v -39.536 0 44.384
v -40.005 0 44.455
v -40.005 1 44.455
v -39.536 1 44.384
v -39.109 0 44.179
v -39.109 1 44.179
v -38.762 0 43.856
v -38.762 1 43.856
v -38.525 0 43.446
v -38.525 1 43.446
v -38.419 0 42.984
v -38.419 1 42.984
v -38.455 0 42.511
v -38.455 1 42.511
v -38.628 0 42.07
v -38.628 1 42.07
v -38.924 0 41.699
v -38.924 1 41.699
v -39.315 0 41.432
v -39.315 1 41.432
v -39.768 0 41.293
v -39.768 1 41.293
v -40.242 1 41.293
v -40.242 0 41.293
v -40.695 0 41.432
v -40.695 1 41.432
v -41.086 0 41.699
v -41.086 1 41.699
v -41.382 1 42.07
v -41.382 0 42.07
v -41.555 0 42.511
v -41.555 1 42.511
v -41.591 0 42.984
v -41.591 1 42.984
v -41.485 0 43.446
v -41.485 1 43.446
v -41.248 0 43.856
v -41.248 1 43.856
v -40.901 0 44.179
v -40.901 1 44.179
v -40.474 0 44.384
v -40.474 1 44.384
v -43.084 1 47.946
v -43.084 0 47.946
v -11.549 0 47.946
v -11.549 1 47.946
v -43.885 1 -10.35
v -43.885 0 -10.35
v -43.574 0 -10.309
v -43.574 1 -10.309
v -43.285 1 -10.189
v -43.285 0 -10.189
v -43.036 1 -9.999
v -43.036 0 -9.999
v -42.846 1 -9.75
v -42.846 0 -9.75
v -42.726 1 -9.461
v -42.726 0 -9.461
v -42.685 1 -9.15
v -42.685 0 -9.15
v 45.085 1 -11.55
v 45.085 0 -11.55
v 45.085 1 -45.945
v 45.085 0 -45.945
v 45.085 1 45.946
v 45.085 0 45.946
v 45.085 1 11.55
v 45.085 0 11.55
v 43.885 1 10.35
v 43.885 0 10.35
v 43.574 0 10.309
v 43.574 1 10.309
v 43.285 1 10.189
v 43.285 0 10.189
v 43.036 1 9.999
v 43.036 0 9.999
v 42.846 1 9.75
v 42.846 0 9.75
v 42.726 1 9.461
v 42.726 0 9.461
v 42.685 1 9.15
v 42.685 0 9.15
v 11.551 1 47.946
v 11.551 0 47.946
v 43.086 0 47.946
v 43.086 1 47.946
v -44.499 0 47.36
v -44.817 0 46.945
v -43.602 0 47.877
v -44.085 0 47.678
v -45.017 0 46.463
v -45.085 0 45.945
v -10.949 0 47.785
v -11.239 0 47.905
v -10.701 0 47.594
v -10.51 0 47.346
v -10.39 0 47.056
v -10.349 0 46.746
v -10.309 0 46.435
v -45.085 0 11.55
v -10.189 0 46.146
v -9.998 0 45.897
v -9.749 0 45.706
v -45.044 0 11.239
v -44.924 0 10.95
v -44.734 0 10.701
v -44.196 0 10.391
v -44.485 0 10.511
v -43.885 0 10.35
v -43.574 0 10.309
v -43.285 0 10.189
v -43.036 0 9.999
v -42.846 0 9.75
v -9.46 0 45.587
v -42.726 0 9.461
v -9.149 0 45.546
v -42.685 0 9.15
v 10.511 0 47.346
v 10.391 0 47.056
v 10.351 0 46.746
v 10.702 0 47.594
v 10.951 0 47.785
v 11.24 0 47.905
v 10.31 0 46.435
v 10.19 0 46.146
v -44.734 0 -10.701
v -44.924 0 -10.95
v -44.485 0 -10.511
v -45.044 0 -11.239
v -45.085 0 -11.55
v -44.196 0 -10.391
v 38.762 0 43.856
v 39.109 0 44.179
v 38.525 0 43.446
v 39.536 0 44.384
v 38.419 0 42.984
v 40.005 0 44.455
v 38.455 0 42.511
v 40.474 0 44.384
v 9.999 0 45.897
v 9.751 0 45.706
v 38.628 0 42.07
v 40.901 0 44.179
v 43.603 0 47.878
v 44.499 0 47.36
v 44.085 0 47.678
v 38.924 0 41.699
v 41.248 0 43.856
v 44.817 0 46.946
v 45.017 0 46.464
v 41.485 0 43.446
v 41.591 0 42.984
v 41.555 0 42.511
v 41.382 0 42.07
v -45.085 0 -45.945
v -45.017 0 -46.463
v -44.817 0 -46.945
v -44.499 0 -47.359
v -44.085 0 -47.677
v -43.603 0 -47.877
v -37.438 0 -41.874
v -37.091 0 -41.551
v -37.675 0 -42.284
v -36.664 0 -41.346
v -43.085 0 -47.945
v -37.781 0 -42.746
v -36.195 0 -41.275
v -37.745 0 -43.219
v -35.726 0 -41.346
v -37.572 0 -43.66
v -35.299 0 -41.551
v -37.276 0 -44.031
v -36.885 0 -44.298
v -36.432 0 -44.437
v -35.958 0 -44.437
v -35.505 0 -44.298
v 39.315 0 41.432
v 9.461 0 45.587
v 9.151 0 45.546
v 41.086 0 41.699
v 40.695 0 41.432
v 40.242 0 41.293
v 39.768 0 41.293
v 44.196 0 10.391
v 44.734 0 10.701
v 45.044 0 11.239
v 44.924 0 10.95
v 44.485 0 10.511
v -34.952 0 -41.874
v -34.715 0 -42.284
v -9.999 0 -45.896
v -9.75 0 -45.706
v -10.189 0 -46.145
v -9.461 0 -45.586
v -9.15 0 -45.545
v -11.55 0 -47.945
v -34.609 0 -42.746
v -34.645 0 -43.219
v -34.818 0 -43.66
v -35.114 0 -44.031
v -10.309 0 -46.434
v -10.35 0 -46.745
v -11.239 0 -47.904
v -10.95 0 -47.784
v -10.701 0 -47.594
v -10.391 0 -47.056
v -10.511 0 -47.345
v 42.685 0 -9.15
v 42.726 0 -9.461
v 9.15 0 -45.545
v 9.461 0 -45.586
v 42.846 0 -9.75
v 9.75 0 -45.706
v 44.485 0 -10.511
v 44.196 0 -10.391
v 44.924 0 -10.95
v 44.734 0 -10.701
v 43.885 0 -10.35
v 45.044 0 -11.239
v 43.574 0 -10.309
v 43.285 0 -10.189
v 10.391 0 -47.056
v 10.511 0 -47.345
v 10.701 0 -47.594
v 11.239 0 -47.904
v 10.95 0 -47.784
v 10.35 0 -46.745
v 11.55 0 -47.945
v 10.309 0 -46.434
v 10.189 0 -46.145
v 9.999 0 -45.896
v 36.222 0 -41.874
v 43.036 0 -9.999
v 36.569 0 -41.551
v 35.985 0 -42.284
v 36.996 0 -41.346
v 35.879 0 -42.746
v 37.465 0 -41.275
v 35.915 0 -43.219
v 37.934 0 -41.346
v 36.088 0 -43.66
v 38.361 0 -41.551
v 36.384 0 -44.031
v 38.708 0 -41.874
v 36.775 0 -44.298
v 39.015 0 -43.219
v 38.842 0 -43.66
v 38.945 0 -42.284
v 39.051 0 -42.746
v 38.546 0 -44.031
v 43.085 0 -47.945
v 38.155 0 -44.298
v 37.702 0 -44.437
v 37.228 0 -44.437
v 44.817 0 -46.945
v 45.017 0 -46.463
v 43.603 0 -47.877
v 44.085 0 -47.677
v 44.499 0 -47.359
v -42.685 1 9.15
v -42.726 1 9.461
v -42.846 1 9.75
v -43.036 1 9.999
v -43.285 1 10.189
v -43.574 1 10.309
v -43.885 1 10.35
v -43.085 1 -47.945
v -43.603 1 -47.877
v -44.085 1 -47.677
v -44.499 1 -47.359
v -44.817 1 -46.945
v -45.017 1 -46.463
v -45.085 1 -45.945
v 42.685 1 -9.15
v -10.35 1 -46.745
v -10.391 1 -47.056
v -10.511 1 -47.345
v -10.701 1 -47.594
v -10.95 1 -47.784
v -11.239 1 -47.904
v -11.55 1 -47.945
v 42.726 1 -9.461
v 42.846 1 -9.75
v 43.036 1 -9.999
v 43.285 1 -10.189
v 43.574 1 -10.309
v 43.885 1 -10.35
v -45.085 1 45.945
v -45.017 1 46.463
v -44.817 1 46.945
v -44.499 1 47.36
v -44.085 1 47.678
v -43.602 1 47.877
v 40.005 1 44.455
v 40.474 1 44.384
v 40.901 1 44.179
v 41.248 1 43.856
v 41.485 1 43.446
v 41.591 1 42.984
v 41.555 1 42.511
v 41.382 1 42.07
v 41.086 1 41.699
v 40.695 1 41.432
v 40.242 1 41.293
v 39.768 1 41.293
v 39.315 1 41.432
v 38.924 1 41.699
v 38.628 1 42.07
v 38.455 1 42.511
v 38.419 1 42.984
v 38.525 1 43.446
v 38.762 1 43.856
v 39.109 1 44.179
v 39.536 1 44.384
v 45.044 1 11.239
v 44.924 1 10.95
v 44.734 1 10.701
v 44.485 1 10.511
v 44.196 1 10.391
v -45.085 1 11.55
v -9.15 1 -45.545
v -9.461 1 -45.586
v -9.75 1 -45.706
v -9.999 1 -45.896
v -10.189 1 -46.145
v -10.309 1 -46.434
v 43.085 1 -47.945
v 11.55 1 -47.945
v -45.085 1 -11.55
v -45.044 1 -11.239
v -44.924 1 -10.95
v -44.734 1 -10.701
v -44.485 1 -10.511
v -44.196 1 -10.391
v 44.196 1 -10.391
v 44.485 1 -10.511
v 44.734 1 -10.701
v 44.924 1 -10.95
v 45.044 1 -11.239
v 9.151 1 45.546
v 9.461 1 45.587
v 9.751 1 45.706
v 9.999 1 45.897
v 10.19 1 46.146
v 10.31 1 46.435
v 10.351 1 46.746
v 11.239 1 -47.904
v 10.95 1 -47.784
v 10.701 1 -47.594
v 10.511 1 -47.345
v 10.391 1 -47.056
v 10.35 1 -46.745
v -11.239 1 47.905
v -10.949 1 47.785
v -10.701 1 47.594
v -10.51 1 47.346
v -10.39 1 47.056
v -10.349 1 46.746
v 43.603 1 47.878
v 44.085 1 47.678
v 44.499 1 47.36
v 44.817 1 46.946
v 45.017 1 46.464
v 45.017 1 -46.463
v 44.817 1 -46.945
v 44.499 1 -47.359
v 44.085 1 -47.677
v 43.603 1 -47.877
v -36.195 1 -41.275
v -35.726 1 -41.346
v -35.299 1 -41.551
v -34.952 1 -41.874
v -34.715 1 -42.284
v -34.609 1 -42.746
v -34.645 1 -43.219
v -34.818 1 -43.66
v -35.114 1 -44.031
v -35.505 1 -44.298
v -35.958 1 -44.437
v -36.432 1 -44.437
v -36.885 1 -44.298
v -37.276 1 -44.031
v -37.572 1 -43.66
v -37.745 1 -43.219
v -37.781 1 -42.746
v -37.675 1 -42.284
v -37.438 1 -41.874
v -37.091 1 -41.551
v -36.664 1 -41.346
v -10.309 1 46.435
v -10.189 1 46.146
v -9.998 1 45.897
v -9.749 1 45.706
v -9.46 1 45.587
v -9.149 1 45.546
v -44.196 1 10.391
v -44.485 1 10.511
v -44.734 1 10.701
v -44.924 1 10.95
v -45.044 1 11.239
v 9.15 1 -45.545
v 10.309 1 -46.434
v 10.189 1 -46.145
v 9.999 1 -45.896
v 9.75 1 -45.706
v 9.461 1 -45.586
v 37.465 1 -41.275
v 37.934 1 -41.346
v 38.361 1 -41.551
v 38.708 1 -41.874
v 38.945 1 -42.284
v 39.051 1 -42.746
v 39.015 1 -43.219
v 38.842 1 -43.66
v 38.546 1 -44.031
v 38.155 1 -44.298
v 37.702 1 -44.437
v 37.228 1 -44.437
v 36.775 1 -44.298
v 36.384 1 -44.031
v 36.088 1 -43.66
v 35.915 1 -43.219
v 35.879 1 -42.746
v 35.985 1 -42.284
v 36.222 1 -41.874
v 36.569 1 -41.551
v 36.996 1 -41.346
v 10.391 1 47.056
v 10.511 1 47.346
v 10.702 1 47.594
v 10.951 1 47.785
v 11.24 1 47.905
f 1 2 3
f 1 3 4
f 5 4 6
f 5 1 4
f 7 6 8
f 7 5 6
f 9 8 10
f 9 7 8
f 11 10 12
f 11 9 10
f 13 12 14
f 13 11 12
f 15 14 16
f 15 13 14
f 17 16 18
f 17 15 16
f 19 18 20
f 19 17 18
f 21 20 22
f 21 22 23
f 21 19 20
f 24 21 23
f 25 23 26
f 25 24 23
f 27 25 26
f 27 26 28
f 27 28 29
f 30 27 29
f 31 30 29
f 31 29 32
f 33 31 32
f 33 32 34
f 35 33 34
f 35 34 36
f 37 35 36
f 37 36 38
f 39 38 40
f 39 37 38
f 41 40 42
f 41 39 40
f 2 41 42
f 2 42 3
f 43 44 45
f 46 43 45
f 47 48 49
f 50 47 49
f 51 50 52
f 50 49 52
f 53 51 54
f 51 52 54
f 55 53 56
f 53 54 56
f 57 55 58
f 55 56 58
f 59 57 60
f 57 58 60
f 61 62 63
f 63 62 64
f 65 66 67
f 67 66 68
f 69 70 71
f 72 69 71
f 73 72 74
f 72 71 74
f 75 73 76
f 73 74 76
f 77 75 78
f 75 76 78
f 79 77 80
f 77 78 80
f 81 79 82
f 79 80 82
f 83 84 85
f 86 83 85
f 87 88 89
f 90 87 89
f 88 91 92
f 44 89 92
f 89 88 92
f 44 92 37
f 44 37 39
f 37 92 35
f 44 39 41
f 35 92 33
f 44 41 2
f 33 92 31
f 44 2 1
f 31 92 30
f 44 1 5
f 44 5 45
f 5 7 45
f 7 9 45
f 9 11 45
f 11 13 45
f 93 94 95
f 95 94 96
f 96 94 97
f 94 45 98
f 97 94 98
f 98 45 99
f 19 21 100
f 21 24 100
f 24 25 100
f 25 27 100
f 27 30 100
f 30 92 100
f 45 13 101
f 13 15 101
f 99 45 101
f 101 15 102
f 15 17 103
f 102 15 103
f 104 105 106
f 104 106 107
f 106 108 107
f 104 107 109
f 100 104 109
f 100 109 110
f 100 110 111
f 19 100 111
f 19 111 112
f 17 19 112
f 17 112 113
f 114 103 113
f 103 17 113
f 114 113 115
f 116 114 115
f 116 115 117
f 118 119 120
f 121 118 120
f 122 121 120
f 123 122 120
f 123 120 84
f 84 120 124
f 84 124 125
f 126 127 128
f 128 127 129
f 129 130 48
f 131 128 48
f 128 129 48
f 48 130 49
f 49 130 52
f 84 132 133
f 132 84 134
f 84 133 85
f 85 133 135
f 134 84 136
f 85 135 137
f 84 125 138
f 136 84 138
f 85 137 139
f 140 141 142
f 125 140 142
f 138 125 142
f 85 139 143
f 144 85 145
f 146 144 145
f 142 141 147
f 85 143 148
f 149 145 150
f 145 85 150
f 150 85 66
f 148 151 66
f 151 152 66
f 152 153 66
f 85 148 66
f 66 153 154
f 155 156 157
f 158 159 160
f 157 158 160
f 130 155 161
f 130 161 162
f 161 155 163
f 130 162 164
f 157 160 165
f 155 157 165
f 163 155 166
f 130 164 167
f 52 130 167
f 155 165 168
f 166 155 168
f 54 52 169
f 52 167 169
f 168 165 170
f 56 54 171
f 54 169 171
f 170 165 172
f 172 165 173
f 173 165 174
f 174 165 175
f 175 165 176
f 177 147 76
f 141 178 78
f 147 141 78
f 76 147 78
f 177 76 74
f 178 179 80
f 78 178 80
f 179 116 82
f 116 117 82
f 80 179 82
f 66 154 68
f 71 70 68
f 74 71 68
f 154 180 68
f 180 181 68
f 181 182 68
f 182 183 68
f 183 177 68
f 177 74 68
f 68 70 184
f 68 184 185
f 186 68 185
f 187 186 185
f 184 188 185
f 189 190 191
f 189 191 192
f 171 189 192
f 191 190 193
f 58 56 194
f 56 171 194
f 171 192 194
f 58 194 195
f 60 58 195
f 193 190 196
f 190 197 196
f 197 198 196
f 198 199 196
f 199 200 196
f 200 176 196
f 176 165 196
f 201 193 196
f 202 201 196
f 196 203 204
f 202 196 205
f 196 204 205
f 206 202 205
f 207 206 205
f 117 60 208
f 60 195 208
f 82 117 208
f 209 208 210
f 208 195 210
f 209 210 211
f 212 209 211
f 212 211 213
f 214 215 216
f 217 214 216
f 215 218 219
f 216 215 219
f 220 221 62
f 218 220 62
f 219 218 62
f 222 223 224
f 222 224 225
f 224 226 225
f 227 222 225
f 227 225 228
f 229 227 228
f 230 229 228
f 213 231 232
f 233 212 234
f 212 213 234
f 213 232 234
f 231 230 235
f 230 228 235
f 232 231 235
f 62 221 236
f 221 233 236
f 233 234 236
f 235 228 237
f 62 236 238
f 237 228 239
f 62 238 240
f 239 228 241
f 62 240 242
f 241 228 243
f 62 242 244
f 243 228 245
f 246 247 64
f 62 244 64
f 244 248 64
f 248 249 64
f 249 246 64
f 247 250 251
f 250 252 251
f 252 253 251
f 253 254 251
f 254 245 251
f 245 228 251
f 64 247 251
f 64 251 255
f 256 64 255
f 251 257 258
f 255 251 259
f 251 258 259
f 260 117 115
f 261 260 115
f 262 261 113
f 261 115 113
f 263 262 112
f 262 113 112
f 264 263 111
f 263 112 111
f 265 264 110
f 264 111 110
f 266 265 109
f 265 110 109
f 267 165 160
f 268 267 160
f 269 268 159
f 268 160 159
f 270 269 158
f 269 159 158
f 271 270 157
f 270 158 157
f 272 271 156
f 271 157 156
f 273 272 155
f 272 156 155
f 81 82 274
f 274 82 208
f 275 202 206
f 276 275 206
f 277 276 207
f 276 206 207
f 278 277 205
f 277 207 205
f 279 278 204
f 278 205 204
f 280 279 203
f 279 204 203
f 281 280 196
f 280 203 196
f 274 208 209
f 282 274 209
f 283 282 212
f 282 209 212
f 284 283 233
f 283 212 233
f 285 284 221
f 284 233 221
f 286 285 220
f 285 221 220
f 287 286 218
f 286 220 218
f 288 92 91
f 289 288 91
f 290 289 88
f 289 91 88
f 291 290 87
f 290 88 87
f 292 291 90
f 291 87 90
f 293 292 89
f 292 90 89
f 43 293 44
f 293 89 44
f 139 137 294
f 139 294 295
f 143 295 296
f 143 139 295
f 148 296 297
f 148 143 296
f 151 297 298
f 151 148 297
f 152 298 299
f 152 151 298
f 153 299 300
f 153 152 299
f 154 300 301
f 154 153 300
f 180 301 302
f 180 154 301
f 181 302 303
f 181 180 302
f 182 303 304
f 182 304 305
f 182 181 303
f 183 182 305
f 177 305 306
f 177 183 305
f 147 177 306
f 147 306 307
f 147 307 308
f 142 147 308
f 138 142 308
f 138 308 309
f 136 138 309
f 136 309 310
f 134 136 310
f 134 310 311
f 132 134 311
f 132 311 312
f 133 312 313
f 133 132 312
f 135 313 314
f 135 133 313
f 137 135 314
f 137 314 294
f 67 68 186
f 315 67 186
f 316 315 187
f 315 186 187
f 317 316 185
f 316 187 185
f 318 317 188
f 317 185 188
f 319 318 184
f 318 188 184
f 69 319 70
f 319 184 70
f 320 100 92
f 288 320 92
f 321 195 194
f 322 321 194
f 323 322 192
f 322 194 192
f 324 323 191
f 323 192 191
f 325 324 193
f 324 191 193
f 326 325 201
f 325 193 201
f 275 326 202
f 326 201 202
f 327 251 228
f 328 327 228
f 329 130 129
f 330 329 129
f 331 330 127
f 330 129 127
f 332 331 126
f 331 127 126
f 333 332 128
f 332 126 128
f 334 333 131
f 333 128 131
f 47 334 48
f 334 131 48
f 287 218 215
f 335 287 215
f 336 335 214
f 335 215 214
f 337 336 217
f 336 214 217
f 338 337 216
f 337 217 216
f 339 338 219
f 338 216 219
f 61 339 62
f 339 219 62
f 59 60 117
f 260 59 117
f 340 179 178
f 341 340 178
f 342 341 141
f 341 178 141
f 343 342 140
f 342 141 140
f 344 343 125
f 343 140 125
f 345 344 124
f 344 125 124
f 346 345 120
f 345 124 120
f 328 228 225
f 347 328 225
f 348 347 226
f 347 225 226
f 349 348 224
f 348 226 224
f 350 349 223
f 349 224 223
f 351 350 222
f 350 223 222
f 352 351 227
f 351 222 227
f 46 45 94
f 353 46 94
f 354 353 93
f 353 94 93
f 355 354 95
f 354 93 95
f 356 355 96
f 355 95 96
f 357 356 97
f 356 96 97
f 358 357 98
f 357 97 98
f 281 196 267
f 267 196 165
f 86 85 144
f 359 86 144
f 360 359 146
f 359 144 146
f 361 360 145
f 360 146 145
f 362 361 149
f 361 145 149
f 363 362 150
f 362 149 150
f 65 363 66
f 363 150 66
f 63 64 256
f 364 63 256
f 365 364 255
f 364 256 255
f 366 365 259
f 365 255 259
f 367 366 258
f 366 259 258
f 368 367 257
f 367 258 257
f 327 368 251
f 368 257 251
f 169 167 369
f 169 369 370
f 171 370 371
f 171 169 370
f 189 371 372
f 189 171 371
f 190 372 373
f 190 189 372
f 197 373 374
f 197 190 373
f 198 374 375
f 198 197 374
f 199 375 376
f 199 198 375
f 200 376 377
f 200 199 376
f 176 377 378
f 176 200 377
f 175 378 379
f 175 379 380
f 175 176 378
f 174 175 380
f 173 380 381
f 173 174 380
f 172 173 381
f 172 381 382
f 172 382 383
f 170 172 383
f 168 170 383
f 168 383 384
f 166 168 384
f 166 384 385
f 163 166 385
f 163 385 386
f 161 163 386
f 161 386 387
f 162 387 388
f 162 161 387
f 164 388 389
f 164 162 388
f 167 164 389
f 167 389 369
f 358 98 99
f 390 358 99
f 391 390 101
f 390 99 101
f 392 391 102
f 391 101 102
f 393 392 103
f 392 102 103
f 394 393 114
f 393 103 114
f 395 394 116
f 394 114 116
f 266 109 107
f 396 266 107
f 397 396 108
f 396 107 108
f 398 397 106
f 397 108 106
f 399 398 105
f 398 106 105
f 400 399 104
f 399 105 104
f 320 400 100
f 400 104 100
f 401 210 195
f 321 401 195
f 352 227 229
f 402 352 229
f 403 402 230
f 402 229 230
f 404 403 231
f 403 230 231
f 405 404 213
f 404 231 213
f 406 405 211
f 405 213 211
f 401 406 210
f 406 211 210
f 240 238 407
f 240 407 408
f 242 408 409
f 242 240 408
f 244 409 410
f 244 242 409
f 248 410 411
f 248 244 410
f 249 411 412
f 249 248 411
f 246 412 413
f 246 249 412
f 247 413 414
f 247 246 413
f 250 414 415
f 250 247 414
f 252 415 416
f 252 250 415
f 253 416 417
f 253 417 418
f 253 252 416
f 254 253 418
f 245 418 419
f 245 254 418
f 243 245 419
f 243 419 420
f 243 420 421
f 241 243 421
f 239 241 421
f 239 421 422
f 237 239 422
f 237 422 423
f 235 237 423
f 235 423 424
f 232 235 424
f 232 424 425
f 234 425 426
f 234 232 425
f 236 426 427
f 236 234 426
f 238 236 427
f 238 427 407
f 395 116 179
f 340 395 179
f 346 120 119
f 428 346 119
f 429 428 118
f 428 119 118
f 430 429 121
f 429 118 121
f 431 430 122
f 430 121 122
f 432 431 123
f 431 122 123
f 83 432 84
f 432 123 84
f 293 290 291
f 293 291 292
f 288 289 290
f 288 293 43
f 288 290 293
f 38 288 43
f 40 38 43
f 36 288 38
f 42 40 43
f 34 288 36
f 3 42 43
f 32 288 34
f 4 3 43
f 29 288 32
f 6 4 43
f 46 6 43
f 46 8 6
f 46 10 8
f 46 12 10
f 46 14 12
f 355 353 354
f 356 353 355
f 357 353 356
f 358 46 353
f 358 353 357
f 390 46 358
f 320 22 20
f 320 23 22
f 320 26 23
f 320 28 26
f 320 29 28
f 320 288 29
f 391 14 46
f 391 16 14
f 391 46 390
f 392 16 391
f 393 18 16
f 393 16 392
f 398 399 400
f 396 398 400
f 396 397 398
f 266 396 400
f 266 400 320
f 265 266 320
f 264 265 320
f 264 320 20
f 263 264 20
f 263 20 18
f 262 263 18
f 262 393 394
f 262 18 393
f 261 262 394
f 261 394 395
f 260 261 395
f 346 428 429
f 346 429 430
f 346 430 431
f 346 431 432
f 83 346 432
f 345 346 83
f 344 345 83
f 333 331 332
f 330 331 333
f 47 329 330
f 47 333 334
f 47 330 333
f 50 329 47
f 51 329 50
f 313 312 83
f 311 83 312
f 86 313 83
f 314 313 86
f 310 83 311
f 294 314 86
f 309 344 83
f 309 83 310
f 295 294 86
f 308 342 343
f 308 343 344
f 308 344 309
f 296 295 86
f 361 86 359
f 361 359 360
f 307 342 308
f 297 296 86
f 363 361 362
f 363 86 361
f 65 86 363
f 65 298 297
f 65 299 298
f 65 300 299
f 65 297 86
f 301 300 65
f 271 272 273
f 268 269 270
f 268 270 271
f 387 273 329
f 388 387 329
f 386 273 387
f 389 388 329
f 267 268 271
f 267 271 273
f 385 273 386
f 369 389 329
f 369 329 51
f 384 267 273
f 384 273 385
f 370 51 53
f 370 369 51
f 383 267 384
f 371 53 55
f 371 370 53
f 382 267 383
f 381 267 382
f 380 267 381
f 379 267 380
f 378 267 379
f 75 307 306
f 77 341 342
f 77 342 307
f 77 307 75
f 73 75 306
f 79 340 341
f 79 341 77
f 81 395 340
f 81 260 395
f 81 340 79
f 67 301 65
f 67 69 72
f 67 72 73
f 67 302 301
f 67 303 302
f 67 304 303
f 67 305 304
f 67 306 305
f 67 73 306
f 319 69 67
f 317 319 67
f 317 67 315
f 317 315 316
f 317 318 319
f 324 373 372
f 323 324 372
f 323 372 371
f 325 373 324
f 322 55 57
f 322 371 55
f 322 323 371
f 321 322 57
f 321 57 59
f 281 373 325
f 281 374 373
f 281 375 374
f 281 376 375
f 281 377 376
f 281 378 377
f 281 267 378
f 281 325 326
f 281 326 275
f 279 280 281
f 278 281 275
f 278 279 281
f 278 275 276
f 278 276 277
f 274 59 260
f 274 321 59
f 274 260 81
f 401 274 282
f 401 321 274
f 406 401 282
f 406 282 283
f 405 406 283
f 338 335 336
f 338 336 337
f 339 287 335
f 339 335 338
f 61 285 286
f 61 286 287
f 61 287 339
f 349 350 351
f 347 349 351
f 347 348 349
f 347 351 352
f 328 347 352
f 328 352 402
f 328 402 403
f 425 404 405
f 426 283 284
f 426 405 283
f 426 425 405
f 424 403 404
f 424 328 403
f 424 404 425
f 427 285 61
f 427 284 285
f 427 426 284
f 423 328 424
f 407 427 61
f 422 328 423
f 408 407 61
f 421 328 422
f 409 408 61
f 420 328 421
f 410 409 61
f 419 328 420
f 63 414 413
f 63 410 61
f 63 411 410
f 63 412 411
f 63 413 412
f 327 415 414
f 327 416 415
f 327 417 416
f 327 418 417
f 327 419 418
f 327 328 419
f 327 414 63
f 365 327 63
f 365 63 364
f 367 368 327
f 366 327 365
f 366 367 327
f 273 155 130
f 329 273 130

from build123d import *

# Parameters (mm, degrees)
SKETCH_1_R      = 1.59
EXTRUDE_1_DEPTH = 1


with BuildPart() as part:
    # Эскиз1 → Бобышка-Вытянуть1 (new body)
    with BuildSketch(Plane(origin=(0, 0, 0), x_dir=(1, 0, 0), z_dir=(0, 1, 0))):
        with BuildLine():
            Line((-45.084998549, -11.549999236), (-45.084998549, -45.944999694))
            ThreePointArc((-45.084998549, -45.944999694), (-44.499026016, -47.35966253), (-43.084363181, -47.945635063))
            Line((-43.084363181, -47.945635063), (-11.549432233, -47.945635063))
            ThreePointArc((-11.549432233, -47.945635063), (-10.700904348, -47.594163453), (-10.349432233, -46.745635778))
            ThreePointArc((-10.349432233, -46.745635778), (-9.997959671, -45.897107024), (-9.149430707, -45.545634967))
            Line((-9.149430707, -45.545634967), (9.15056853, -45.545634967))
            ThreePointArc((9.15056853, -45.545634967), (9.999097494, -45.897107024), (10.350570056, -46.745635778))
            ThreePointArc((10.350570056, -46.745635778), (10.702042171, -47.594163453), (11.550570056, -47.945635063))
            Line((11.550570056, -47.945635063), (43.085566089, -47.945635063))
            ThreePointArc((43.085566089, -47.945635063), (44.499379352, -47.360014435), (45.08499998, -45.946201172))
            Line((45.08499998, -45.946201172), (45.08499998, -11.550001001))
            ThreePointArc((45.08499998, -11.550001001), (44.73352809, -10.70147331), (43.885000099, -10.350002145))
            ThreePointArc((43.885000099, -10.350002145), (43.03647086, -9.998530464), (42.684998454, -9.150001525))
            Line((42.684998454, -9.150001525), (42.684998454, 9.150001525))
            ThreePointArc((42.684998454, 9.150001525), (43.03647086, 9.998530464), (43.885000099, 10.350002145))
            ThreePointArc((43.885000099, 10.350002145), (44.733527178, 10.701472863), (45.08499962, 11.549999228))
            Line((45.08499962, 11.549999228), (45.08499962, 45.944999694))
            ThreePointArc((45.08499962, 45.944999694), (44.499213182, 47.359213257), (43.08499962, 47.944999694))
            Line((43.08499962, 47.944999694), (11.549999772, 47.944999694))
            ThreePointArc((11.549999772, 47.944999694), (10.701471635, 47.593527832), (10.349999772, 46.744999694))
            ThreePointArc((10.349999772, 46.744999694), (9.998527463, 45.896470478), (9.149998246, 45.544998168))
            Line((9.149998246, 45.544998168), (-9.149997176, 45.544998168))
            ThreePointArc((-9.149997176, 45.544998168), (-9.998526392, 45.896470478), (-10.349998702, 46.744999694))
            ThreePointArc((-10.349998702, 46.744999694), (-10.701470564, 47.593527832), (-11.549998702, 47.944999694))
            Line((-11.549998702, 47.944999694), (-43.084998549, 47.944999694))
            ThreePointArc((-43.084998549, 47.944999694), (-44.499212112, 47.359213257), (-45.084998549, 45.944999694))
            Line((-45.084998549, 45.944999694), (-45.084998549, 11.549999236))
            ThreePointArc((-45.084998549, 11.549999236), (-44.733526654, 10.701471175), (-43.884998501, 10.349999499))
            ThreePointArc((-43.884998501, 10.349999499), (-43.036470349, 9.998527823), (-42.684998454, 9.149999761))
            Line((-42.684998454, 9.149999761), (-42.684998454, -9.149999761))
            ThreePointArc((-42.684998454, -9.149999761), (-43.036470608, -9.998528446), (-43.884999384, -10.350000381))
            ThreePointArc((-43.884999384, -10.350000381), (-44.733526912, -10.701471799), (-45.084998549, -11.549999236))
        make_face()
        with Locations(Location((37.465001451, 42.865000306, 0), (0, 0, 270))):
            Circle(SKETCH_1_R, mode=Mode.SUBTRACT)
        with Locations(Location((40.005001451, -42.864999694, 0), (0, 0, 270))):
            Circle(SKETCH_1_R, mode=Mode.SUBTRACT)
        with Locations(Location((-40.004998549, -42.864999694, 0), (0, 0, 270))):
            Circle(SKETCH_1_R, mode=Mode.SUBTRACT)
        with Locations(Location((-36.194998549, 42.865000306, 0), (0, 0, 270))):
            Circle(SKETCH_1_R, mode=Mode.SUBTRACT)
    extrude(amount=EXTRUDE_1_DEPTH)


solid = part.part
